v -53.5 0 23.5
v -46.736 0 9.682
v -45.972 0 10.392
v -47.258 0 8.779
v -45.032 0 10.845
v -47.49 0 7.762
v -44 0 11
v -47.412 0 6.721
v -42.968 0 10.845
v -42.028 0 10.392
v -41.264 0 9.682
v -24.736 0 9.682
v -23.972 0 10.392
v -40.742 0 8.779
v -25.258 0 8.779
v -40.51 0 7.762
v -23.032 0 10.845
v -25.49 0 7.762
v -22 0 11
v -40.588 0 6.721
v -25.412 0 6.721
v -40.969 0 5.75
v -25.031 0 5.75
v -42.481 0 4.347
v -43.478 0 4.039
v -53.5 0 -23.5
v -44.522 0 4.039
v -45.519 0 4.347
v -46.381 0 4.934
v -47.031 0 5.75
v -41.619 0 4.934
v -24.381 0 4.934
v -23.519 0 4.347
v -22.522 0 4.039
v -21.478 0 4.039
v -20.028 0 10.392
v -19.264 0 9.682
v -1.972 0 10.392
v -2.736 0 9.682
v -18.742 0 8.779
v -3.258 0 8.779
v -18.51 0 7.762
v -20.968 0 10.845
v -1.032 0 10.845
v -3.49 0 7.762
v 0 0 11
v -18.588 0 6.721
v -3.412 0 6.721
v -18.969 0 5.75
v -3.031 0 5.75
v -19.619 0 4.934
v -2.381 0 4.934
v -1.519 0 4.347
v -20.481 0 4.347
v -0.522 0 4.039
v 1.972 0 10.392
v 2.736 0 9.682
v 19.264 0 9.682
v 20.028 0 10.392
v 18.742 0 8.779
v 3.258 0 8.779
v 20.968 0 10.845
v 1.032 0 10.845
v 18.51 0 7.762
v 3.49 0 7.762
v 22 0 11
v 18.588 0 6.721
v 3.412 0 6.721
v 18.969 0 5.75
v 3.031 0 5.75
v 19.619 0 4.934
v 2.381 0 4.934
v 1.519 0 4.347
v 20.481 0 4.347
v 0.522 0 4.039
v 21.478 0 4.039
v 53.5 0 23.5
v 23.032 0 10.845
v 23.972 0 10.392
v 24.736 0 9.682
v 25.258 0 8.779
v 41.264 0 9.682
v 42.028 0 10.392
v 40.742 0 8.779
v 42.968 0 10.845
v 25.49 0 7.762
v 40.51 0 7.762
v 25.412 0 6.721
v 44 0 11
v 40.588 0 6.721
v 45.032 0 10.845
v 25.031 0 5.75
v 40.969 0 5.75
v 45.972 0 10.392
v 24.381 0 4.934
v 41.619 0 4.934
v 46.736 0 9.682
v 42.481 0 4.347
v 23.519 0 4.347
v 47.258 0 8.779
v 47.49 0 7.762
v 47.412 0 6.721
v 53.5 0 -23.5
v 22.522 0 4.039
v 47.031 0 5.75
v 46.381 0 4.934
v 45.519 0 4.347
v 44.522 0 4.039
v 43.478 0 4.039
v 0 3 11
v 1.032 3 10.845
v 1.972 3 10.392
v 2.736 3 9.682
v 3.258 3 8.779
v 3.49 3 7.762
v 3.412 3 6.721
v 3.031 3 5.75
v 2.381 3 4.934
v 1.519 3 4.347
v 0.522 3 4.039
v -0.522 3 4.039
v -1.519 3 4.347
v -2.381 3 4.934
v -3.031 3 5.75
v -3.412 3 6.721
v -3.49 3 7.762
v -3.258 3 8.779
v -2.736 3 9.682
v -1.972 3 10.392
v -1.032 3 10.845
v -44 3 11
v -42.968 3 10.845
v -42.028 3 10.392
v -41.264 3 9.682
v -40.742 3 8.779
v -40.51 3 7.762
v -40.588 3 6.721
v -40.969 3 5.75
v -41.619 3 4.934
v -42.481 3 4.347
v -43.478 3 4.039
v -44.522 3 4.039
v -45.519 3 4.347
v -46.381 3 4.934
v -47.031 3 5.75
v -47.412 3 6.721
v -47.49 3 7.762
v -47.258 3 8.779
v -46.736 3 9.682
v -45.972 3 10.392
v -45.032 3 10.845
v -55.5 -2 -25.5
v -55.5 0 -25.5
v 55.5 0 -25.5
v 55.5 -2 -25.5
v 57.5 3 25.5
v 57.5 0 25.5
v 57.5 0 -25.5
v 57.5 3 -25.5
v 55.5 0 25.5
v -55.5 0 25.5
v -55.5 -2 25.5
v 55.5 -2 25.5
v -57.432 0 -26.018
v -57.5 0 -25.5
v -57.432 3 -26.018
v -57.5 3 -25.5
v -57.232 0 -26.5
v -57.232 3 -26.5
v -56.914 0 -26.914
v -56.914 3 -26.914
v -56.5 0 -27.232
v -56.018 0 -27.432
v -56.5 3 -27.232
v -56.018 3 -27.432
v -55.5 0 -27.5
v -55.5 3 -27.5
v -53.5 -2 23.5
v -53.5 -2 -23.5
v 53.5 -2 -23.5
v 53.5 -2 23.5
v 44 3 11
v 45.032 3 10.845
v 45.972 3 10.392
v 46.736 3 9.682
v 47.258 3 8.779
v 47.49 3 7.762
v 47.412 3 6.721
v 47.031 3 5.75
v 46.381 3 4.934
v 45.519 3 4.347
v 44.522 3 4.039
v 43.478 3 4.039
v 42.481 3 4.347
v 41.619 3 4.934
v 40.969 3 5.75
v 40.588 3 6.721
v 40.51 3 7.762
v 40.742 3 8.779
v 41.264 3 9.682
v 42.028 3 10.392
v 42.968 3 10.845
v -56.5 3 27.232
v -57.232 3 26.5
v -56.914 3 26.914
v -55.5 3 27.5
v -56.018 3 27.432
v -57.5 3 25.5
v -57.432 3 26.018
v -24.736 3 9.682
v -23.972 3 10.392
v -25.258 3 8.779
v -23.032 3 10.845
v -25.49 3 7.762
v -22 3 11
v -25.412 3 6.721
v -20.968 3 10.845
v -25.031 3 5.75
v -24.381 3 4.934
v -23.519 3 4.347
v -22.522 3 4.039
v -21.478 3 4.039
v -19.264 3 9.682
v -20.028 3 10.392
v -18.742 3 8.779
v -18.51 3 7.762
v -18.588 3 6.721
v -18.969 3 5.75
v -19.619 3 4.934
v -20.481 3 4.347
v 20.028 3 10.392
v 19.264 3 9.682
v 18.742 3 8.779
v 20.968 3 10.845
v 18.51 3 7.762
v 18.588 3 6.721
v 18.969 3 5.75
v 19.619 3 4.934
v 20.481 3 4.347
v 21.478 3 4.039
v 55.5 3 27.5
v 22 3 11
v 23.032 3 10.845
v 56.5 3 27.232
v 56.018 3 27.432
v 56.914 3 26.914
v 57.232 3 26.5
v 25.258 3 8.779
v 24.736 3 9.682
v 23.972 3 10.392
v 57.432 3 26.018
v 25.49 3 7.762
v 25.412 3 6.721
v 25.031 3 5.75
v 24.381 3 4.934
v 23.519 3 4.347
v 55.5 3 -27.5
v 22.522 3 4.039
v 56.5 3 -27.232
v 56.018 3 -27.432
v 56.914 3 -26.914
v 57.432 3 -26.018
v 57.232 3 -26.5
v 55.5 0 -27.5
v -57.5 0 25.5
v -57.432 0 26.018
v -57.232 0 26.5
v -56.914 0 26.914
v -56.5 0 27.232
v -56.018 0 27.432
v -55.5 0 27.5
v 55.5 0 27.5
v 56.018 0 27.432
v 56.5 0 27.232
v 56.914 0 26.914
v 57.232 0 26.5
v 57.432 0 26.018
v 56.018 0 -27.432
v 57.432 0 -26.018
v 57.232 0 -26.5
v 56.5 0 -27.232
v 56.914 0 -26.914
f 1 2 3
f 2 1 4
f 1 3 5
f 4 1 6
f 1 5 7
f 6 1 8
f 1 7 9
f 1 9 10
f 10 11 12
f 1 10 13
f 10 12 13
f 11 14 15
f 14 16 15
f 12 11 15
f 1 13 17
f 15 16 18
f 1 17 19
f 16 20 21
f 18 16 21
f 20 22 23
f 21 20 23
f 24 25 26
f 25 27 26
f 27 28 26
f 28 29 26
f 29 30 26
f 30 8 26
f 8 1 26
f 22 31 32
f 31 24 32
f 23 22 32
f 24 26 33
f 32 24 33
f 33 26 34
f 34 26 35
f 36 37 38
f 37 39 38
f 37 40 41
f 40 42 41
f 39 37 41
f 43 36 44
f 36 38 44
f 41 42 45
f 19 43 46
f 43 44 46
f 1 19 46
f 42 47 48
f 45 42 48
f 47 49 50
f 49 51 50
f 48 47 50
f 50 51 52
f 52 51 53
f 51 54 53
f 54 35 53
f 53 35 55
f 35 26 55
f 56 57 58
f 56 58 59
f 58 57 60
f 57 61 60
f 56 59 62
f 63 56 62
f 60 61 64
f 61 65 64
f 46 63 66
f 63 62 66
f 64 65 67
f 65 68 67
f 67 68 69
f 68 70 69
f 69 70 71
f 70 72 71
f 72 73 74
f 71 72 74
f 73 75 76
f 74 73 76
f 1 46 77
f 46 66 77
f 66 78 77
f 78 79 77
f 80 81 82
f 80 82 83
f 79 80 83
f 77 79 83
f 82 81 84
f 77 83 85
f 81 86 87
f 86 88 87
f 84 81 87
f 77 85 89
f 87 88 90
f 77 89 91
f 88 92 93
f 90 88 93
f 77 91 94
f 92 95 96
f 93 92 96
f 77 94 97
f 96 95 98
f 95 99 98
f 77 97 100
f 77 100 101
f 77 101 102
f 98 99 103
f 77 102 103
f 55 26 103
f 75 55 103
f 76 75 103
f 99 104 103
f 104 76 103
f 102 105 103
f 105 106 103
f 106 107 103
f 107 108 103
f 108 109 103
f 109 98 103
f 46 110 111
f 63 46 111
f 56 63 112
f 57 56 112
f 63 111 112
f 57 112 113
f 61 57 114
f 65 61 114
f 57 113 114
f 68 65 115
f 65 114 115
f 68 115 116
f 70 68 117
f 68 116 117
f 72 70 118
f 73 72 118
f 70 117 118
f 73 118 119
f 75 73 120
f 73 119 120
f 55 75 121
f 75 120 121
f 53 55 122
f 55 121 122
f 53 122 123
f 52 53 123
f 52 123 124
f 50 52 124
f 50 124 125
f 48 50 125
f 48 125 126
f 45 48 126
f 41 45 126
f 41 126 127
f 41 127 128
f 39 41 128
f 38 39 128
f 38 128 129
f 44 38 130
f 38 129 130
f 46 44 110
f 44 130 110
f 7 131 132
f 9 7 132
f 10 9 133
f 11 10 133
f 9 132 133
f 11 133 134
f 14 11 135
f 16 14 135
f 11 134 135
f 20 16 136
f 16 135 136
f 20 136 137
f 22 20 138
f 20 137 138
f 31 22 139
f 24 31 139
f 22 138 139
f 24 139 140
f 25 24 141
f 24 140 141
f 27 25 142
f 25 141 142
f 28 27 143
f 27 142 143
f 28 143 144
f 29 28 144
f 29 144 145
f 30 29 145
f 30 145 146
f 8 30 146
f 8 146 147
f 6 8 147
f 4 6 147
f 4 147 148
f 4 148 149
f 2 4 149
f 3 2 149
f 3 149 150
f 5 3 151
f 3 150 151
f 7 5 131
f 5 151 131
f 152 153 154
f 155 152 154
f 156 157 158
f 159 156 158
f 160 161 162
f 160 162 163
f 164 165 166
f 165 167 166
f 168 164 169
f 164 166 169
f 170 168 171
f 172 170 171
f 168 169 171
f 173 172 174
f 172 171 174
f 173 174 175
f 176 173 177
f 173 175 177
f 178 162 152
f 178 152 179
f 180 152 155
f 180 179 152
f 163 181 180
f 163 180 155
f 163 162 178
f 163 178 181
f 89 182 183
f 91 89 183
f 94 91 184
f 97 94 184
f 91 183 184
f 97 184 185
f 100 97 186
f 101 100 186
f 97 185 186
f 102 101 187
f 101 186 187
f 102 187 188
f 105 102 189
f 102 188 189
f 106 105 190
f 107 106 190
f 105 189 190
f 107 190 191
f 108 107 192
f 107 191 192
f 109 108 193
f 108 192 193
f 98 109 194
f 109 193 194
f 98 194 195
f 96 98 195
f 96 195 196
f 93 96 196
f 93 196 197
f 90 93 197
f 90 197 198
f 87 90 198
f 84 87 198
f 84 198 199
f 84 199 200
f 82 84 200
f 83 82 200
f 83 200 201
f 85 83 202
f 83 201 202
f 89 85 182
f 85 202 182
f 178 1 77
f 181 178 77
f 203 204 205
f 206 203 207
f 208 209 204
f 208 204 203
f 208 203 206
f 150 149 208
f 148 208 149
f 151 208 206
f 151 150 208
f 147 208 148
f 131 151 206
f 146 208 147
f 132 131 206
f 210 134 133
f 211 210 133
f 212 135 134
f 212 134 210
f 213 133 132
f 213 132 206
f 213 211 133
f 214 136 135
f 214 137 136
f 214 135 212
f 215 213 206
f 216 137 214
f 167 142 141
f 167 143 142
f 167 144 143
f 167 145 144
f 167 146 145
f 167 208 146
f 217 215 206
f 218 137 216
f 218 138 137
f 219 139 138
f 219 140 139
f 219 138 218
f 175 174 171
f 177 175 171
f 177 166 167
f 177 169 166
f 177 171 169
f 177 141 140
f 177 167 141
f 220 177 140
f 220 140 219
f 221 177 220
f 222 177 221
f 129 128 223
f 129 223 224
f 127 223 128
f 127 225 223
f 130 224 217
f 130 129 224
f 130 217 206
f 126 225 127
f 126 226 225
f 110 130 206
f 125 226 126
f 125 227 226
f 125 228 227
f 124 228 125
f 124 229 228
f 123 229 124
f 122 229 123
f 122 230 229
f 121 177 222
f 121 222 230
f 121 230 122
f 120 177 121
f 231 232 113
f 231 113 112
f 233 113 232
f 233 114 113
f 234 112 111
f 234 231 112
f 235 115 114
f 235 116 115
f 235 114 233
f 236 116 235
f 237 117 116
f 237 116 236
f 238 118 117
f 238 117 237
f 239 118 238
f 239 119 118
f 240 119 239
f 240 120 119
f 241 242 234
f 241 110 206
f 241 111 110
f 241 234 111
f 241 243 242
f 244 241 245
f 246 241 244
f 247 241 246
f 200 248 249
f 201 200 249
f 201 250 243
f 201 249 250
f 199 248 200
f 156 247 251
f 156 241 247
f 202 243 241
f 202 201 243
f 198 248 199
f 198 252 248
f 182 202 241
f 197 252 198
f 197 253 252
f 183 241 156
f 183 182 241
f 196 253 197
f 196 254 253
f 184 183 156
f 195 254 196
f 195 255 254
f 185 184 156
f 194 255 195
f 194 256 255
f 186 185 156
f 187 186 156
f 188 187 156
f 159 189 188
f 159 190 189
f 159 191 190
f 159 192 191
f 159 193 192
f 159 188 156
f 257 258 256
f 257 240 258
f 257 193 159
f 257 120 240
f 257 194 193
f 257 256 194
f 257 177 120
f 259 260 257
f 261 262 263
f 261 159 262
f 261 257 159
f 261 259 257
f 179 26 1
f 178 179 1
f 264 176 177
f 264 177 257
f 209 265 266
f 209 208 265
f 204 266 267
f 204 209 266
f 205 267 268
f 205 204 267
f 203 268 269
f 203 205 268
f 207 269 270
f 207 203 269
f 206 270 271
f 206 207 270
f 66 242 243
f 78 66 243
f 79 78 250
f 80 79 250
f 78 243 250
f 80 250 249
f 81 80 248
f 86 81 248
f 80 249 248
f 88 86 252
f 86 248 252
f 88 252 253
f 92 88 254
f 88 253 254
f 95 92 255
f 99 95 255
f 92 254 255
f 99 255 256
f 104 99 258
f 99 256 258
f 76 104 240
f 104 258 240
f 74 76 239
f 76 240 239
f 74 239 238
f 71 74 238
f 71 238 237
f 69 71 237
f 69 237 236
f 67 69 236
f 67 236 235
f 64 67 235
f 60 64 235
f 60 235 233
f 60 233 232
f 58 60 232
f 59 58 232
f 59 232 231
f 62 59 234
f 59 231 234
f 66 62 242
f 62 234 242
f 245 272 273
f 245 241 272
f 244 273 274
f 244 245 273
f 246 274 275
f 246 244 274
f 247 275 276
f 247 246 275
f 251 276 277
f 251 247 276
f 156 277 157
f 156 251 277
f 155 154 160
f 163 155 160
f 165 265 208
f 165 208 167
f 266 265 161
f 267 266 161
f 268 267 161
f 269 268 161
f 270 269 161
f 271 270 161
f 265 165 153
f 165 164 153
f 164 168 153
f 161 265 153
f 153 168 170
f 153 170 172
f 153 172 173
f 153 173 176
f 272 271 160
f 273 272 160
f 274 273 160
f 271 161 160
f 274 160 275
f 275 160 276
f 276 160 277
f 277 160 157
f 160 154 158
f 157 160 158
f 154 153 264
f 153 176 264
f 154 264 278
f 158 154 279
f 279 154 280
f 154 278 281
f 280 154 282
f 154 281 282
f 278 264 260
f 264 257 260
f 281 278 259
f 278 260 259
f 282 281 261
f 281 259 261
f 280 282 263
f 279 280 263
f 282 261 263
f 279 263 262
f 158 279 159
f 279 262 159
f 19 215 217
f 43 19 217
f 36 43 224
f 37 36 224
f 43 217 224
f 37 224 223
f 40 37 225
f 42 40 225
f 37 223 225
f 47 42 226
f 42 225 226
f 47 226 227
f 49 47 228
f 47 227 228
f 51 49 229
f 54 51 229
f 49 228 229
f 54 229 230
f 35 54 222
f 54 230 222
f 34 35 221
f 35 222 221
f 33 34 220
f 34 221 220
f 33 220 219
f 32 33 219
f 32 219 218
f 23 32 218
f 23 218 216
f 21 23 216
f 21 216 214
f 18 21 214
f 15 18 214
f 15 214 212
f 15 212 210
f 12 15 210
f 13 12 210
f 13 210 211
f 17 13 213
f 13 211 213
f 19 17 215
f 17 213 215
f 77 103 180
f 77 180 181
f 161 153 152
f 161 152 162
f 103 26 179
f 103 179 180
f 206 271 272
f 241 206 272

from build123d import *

# Parameters (mm, degrees)
SKETCH_1_W          = 115
SKETCH_1_H          = 55
EXTRUDE_1_DEPTH     = 3
SKETCH_2_R          = 3.5
CUT_EXTRUDE_1_DEPTH = 3
SKETCH_4_W          = 111
SKETCH_4_H          = 51
SKETCH_4_W_2        = 107
SKETCH_4_H_2        = 47
EXTRUDE_2_DEPTH     = 2
FILLET_1_R          = 2


with BuildPart() as part:
    # 草图1 → 凸台-拉伸1 (new body)
    with BuildSketch(Plane(origin=(0, 0, 0), x_dir=(1, 0, 0), z_dir=(0, 1, 0))):
        Rectangle(SKETCH_1_W, SKETCH_1_H)
    extrude(amount=EXTRUDE_1_DEPTH)

    # 草图2 → 切除-拉伸1 (cut)
    with BuildSketch(Plane(origin=(0, 3, 0), x_dir=(1, 0, 0), z_dir=(0, 1, 0))):
        with Locations(Location((-44, -7.5, 0), (0, 0, 270))):
            Circle(SKETCH_2_R)
        with Locations(Location((-22, -7.5, 0), (0, 0, 270))):
            Circle(SKETCH_2_R)
        with Locations(Location((0, -7.5, 0), (0, 0, 270))):
            Circle(SKETCH_2_R)
        with Locations(Location((22, -7.5, 0), (0, 0, 270))):
            Circle(SKETCH_2_R)
        with Locations(Location((44, -7.5, 0), (0, 0, 270))):
            Circle(SKETCH_2_R)
    extrude(amount=-CUT_EXTRUDE_1_DEPTH, mode=Mode.SUBTRACT)

    # 草图4 → 凸台-拉伸2 (add)
    with BuildSketch(Plane.XZ):
        Rectangle(SKETCH_4_W, SKETCH_4_H)
        Rectangle(SKETCH_4_W_2, SKETCH_4_H_2, mode=Mode.SUBTRACT)
    extrude(amount=EXTRUDE_2_DEPTH)

    # 圆角1
    fillet_1_edges = [part.edges().sort_by_distance(p)[0] for p in [
        (57.5, 1.5, 27.5),
        (-57.5, 1.5, 27.5),
        (-57.5, 1.5, -27.5),
        (57.5, 1.5, -27.5),
    ]]
    fillet(fillet_1_edges, radius=FILLET_1_R)


solid = part.part
